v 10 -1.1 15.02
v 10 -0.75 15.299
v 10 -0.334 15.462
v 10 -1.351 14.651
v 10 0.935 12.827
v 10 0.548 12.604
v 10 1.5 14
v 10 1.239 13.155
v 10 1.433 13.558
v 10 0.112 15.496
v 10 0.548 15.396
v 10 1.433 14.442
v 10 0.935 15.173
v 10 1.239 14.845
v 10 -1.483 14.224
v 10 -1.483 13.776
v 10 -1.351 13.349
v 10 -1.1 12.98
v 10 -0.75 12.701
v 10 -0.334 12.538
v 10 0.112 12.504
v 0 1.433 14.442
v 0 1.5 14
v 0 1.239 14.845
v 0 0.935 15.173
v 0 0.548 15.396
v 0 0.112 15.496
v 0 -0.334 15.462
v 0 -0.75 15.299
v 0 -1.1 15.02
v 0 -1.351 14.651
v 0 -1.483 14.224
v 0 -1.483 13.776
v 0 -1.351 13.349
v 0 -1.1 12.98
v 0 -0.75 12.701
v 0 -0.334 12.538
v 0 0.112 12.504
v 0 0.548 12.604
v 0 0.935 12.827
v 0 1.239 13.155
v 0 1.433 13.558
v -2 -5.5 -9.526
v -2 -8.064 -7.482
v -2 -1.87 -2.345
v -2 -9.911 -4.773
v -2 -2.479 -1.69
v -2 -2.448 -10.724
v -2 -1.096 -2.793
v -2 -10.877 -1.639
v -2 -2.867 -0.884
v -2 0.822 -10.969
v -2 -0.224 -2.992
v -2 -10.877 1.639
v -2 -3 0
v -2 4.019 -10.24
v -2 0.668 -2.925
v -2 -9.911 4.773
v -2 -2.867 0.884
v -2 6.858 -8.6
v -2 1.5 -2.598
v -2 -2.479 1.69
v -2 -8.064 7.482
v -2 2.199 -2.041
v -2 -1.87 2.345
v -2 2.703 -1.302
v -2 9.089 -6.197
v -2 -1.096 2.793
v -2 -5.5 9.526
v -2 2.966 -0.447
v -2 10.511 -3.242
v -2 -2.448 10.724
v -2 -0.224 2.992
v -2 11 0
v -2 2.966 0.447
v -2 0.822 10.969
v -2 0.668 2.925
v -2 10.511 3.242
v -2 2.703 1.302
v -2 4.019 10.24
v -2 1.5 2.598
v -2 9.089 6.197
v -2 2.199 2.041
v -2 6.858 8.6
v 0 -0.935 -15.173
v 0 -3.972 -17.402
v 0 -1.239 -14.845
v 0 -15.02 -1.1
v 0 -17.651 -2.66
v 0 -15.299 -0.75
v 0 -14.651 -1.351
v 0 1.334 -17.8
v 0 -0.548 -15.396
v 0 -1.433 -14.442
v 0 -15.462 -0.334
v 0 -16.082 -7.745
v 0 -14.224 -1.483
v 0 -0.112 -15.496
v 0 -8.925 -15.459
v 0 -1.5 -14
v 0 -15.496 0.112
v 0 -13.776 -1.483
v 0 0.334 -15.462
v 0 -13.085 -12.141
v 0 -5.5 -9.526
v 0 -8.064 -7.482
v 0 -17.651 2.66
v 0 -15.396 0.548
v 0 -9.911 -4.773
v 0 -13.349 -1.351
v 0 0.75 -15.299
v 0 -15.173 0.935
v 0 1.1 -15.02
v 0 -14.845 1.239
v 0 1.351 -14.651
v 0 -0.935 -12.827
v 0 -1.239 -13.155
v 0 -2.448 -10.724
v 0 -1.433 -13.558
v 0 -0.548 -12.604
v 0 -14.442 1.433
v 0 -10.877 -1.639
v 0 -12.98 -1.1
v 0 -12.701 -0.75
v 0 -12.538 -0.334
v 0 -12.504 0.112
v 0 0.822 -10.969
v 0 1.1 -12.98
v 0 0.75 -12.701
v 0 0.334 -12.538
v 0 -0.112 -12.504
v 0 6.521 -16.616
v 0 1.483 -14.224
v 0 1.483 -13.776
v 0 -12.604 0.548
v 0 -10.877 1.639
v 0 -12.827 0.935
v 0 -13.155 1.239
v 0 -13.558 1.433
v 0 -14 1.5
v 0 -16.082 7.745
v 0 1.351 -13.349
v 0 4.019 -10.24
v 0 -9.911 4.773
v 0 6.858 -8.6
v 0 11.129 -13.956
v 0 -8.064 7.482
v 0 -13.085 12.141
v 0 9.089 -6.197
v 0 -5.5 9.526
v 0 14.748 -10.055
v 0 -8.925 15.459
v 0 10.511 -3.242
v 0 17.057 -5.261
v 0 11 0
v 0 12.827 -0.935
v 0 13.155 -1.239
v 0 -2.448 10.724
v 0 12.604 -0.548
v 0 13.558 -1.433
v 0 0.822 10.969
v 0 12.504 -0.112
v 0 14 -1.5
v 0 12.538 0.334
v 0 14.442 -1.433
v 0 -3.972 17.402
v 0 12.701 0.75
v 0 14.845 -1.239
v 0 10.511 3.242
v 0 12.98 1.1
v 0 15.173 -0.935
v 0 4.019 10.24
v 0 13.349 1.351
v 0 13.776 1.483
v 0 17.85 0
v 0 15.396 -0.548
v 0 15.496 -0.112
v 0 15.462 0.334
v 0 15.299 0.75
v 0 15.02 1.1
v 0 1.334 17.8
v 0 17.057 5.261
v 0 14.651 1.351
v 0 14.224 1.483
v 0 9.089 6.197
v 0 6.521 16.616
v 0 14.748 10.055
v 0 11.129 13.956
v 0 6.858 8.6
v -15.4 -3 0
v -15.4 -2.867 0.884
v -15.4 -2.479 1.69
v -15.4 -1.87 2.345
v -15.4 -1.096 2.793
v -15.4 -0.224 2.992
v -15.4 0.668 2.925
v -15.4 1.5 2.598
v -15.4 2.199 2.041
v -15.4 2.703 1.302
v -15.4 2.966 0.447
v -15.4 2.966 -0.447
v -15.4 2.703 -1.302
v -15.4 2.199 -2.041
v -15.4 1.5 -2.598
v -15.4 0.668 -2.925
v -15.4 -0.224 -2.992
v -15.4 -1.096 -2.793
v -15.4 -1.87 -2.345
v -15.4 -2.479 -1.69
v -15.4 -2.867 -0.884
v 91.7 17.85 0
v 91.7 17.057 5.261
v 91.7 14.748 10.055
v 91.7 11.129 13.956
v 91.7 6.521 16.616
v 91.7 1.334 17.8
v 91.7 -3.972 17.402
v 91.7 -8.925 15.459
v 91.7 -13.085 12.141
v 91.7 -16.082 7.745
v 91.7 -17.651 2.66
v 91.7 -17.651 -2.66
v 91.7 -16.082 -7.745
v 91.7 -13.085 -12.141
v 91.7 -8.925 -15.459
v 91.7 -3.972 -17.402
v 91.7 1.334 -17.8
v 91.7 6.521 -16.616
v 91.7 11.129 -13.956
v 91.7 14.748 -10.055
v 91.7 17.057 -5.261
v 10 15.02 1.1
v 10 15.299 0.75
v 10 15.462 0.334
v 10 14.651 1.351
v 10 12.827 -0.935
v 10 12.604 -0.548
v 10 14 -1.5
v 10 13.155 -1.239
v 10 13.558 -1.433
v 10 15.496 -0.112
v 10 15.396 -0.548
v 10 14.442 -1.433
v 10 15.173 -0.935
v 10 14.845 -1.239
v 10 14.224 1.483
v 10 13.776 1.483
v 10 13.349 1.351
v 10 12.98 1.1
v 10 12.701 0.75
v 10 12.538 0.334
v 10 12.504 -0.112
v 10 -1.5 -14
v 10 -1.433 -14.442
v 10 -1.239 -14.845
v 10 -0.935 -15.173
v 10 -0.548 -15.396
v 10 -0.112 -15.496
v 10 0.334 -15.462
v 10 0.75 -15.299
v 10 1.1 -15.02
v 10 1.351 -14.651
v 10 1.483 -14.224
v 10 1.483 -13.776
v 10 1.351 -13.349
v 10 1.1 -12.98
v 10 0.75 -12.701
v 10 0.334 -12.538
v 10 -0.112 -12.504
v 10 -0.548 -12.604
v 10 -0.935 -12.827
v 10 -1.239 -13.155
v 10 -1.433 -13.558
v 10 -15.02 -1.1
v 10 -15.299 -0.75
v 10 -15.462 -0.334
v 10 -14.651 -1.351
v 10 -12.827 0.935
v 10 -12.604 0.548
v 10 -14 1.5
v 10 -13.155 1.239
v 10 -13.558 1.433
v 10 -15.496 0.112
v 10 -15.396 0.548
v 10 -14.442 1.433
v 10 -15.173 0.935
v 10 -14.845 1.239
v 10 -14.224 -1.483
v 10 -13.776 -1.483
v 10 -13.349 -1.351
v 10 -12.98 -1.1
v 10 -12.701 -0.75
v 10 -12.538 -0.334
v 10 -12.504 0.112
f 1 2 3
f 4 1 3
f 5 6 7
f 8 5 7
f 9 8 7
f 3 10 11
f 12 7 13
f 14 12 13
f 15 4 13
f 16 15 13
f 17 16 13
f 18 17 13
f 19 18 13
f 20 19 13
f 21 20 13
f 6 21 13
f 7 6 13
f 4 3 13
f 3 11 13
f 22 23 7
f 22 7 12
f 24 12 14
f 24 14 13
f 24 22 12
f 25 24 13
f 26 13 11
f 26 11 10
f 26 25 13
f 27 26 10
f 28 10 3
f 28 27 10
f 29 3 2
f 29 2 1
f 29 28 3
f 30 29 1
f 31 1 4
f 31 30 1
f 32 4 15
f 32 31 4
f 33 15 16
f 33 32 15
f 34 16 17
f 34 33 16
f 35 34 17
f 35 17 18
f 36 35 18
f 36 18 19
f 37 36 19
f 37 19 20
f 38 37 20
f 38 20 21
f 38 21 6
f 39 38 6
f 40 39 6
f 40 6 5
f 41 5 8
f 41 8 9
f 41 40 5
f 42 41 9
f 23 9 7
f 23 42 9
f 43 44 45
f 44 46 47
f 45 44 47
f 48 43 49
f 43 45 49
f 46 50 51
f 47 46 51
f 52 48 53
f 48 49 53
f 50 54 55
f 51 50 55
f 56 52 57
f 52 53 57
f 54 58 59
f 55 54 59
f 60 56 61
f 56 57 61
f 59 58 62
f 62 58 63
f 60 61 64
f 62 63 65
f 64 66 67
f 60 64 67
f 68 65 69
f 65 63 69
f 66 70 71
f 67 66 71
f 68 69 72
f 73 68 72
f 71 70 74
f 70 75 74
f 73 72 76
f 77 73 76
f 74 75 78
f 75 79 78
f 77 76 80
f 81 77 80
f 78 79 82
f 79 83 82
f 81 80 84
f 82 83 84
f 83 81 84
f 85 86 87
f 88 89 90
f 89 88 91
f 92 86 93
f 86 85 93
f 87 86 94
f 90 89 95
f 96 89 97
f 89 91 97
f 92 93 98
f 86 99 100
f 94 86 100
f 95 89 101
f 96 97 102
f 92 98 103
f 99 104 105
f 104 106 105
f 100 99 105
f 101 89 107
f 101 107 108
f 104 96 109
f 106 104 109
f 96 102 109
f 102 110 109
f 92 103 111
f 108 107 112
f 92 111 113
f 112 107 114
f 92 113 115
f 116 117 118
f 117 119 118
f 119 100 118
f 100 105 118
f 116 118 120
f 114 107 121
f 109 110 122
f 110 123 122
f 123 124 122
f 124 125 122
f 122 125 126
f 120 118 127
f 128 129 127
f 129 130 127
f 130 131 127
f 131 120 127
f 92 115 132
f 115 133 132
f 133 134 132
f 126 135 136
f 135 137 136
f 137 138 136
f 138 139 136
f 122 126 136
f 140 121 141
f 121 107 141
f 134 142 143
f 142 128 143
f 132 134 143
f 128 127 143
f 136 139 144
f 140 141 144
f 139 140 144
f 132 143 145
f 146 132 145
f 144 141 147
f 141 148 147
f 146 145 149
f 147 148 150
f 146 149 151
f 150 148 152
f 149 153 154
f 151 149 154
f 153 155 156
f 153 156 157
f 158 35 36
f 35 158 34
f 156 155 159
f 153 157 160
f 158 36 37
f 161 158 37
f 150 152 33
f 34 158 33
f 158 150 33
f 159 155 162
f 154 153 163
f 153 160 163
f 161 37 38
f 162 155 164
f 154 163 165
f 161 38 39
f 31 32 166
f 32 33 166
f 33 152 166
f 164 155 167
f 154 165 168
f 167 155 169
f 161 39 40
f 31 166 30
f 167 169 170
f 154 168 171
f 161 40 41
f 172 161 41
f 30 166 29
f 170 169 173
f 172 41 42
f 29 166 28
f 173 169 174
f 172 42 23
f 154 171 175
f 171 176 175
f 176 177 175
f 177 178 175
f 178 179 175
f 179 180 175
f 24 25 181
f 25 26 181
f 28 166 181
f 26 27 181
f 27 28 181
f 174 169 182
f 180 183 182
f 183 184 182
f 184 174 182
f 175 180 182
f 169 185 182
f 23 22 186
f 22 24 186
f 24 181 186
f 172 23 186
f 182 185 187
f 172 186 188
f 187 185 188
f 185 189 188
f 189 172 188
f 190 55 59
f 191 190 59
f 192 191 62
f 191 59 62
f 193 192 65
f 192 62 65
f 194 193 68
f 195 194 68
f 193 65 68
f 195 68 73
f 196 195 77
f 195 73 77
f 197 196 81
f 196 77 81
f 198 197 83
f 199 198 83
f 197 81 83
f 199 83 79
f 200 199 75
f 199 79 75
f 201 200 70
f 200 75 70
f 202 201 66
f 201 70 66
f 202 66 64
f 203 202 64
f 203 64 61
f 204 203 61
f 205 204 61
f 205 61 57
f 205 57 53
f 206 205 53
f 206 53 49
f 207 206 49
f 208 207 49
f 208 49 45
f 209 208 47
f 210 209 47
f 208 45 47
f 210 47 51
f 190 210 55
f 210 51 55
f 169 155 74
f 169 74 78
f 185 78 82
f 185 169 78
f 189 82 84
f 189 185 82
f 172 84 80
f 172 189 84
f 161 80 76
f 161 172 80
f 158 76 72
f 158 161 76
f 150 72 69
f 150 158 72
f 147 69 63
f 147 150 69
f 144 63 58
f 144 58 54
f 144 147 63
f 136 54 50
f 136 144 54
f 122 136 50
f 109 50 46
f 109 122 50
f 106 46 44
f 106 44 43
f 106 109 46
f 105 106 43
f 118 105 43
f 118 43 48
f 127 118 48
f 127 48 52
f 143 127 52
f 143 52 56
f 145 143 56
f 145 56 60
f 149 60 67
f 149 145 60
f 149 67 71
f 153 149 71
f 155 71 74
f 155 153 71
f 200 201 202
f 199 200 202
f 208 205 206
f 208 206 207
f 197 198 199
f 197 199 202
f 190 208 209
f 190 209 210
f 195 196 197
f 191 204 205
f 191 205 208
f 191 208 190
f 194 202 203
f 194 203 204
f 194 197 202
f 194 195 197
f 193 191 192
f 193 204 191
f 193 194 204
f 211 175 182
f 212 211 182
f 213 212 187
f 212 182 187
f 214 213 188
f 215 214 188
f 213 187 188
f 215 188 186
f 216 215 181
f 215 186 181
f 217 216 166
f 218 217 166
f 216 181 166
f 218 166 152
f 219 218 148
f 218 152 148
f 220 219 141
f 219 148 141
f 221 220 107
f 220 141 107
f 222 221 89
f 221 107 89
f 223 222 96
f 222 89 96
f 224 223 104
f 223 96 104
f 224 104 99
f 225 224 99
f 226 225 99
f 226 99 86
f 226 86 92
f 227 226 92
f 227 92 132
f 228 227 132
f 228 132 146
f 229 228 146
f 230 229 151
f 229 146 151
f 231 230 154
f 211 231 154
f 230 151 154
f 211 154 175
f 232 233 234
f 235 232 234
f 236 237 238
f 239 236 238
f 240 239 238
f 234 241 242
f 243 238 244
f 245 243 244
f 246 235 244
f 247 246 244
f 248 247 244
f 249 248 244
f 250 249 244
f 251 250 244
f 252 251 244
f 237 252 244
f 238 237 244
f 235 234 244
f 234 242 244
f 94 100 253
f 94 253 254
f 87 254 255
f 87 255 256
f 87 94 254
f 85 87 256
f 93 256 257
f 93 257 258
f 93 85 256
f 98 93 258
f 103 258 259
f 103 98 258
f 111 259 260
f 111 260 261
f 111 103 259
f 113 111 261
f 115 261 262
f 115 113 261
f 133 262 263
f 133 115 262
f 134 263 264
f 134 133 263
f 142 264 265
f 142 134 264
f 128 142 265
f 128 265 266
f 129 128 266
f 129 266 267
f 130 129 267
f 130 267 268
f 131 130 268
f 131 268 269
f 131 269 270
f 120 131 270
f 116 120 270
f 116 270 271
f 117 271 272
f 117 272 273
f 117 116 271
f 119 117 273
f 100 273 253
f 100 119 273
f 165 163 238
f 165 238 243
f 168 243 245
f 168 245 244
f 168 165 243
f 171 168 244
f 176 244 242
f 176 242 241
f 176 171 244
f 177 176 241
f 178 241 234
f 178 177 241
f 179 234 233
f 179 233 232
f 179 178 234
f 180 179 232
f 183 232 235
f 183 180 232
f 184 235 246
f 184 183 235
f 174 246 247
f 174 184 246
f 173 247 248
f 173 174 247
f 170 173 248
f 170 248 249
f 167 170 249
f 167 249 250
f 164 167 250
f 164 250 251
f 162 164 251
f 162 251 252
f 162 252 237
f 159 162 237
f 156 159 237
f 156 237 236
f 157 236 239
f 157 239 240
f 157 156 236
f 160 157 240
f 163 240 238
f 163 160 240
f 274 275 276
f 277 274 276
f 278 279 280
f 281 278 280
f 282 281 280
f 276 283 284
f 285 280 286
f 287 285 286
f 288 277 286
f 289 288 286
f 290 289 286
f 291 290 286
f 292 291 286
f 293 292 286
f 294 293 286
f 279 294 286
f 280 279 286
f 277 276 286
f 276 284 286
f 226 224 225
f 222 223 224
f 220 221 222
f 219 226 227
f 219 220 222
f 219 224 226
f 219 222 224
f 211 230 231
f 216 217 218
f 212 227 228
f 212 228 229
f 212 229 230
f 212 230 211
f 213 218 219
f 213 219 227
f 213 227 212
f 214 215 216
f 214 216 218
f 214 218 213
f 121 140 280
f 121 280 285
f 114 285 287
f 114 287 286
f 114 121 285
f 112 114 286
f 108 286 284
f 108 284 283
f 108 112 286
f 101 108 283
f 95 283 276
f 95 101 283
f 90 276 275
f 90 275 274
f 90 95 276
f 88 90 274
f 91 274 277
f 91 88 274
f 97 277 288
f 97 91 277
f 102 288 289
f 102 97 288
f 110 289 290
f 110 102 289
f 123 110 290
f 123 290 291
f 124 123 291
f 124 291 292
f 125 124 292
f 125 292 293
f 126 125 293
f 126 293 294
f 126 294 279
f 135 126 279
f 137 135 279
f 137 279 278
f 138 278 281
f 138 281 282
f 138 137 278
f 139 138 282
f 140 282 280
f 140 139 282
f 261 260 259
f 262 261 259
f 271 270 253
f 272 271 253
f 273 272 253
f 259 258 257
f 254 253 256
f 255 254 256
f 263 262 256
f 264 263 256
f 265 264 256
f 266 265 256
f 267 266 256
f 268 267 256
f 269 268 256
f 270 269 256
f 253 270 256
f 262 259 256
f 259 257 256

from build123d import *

# Parameters (mm, degrees)
SKETCH_R           = 17.85
PAD_DEPTH          = 91.7
SKETCH001_R        = 11
PAD001_DEPTH       = 2
SKETCH002_R        = 3
PAD002_DEPTH       = 13.4
SKETCH003_R        = 1.5
POCKET_DEPTH       = 10
POLARPATTERN_COUNT = 4


with BuildPart() as part:
    # Sketch → Pad (new body)
    with BuildSketch(Plane.YZ):
        Circle(SKETCH_R)
    extrude(amount=PAD_DEPTH)

    # Sketch001 → Pad001 (join)
    with BuildSketch(Plane.YZ):
        Circle(SKETCH001_R)
    extrude(amount=-PAD001_DEPTH)

    # Sketch002 (on Face5 of Pad001) → Pad002 (join)
    with BuildSketch(Plane(origin=(-2, 0, 0), x_dir=(0, -1, 0), z_dir=(-1, 0, 0))):
        Circle(SKETCH002_R)
    extrude(amount=PAD002_DEPTH)

    # Sketch003 → Pocket (cut)
    with BuildSketch(Plane.YZ):
        with Locations((0, 14)):
            Circle(SKETCH003_R)
    pocket = extrude(amount=POCKET_DEPTH, mode=Mode.SUBTRACT)

    # PolarPattern: Pocket ×4 about axis
    polarpattern_axis = Axis((0, 0, 0), (1, 0, 0))
    for i in range(1, POLARPATTERN_COUNT):
        add(pocket.rotate(polarpattern_axis, i * 360 / POLARPATTERN_COUNT), mode=Mode.SUBTRACT)


solid = part.part
